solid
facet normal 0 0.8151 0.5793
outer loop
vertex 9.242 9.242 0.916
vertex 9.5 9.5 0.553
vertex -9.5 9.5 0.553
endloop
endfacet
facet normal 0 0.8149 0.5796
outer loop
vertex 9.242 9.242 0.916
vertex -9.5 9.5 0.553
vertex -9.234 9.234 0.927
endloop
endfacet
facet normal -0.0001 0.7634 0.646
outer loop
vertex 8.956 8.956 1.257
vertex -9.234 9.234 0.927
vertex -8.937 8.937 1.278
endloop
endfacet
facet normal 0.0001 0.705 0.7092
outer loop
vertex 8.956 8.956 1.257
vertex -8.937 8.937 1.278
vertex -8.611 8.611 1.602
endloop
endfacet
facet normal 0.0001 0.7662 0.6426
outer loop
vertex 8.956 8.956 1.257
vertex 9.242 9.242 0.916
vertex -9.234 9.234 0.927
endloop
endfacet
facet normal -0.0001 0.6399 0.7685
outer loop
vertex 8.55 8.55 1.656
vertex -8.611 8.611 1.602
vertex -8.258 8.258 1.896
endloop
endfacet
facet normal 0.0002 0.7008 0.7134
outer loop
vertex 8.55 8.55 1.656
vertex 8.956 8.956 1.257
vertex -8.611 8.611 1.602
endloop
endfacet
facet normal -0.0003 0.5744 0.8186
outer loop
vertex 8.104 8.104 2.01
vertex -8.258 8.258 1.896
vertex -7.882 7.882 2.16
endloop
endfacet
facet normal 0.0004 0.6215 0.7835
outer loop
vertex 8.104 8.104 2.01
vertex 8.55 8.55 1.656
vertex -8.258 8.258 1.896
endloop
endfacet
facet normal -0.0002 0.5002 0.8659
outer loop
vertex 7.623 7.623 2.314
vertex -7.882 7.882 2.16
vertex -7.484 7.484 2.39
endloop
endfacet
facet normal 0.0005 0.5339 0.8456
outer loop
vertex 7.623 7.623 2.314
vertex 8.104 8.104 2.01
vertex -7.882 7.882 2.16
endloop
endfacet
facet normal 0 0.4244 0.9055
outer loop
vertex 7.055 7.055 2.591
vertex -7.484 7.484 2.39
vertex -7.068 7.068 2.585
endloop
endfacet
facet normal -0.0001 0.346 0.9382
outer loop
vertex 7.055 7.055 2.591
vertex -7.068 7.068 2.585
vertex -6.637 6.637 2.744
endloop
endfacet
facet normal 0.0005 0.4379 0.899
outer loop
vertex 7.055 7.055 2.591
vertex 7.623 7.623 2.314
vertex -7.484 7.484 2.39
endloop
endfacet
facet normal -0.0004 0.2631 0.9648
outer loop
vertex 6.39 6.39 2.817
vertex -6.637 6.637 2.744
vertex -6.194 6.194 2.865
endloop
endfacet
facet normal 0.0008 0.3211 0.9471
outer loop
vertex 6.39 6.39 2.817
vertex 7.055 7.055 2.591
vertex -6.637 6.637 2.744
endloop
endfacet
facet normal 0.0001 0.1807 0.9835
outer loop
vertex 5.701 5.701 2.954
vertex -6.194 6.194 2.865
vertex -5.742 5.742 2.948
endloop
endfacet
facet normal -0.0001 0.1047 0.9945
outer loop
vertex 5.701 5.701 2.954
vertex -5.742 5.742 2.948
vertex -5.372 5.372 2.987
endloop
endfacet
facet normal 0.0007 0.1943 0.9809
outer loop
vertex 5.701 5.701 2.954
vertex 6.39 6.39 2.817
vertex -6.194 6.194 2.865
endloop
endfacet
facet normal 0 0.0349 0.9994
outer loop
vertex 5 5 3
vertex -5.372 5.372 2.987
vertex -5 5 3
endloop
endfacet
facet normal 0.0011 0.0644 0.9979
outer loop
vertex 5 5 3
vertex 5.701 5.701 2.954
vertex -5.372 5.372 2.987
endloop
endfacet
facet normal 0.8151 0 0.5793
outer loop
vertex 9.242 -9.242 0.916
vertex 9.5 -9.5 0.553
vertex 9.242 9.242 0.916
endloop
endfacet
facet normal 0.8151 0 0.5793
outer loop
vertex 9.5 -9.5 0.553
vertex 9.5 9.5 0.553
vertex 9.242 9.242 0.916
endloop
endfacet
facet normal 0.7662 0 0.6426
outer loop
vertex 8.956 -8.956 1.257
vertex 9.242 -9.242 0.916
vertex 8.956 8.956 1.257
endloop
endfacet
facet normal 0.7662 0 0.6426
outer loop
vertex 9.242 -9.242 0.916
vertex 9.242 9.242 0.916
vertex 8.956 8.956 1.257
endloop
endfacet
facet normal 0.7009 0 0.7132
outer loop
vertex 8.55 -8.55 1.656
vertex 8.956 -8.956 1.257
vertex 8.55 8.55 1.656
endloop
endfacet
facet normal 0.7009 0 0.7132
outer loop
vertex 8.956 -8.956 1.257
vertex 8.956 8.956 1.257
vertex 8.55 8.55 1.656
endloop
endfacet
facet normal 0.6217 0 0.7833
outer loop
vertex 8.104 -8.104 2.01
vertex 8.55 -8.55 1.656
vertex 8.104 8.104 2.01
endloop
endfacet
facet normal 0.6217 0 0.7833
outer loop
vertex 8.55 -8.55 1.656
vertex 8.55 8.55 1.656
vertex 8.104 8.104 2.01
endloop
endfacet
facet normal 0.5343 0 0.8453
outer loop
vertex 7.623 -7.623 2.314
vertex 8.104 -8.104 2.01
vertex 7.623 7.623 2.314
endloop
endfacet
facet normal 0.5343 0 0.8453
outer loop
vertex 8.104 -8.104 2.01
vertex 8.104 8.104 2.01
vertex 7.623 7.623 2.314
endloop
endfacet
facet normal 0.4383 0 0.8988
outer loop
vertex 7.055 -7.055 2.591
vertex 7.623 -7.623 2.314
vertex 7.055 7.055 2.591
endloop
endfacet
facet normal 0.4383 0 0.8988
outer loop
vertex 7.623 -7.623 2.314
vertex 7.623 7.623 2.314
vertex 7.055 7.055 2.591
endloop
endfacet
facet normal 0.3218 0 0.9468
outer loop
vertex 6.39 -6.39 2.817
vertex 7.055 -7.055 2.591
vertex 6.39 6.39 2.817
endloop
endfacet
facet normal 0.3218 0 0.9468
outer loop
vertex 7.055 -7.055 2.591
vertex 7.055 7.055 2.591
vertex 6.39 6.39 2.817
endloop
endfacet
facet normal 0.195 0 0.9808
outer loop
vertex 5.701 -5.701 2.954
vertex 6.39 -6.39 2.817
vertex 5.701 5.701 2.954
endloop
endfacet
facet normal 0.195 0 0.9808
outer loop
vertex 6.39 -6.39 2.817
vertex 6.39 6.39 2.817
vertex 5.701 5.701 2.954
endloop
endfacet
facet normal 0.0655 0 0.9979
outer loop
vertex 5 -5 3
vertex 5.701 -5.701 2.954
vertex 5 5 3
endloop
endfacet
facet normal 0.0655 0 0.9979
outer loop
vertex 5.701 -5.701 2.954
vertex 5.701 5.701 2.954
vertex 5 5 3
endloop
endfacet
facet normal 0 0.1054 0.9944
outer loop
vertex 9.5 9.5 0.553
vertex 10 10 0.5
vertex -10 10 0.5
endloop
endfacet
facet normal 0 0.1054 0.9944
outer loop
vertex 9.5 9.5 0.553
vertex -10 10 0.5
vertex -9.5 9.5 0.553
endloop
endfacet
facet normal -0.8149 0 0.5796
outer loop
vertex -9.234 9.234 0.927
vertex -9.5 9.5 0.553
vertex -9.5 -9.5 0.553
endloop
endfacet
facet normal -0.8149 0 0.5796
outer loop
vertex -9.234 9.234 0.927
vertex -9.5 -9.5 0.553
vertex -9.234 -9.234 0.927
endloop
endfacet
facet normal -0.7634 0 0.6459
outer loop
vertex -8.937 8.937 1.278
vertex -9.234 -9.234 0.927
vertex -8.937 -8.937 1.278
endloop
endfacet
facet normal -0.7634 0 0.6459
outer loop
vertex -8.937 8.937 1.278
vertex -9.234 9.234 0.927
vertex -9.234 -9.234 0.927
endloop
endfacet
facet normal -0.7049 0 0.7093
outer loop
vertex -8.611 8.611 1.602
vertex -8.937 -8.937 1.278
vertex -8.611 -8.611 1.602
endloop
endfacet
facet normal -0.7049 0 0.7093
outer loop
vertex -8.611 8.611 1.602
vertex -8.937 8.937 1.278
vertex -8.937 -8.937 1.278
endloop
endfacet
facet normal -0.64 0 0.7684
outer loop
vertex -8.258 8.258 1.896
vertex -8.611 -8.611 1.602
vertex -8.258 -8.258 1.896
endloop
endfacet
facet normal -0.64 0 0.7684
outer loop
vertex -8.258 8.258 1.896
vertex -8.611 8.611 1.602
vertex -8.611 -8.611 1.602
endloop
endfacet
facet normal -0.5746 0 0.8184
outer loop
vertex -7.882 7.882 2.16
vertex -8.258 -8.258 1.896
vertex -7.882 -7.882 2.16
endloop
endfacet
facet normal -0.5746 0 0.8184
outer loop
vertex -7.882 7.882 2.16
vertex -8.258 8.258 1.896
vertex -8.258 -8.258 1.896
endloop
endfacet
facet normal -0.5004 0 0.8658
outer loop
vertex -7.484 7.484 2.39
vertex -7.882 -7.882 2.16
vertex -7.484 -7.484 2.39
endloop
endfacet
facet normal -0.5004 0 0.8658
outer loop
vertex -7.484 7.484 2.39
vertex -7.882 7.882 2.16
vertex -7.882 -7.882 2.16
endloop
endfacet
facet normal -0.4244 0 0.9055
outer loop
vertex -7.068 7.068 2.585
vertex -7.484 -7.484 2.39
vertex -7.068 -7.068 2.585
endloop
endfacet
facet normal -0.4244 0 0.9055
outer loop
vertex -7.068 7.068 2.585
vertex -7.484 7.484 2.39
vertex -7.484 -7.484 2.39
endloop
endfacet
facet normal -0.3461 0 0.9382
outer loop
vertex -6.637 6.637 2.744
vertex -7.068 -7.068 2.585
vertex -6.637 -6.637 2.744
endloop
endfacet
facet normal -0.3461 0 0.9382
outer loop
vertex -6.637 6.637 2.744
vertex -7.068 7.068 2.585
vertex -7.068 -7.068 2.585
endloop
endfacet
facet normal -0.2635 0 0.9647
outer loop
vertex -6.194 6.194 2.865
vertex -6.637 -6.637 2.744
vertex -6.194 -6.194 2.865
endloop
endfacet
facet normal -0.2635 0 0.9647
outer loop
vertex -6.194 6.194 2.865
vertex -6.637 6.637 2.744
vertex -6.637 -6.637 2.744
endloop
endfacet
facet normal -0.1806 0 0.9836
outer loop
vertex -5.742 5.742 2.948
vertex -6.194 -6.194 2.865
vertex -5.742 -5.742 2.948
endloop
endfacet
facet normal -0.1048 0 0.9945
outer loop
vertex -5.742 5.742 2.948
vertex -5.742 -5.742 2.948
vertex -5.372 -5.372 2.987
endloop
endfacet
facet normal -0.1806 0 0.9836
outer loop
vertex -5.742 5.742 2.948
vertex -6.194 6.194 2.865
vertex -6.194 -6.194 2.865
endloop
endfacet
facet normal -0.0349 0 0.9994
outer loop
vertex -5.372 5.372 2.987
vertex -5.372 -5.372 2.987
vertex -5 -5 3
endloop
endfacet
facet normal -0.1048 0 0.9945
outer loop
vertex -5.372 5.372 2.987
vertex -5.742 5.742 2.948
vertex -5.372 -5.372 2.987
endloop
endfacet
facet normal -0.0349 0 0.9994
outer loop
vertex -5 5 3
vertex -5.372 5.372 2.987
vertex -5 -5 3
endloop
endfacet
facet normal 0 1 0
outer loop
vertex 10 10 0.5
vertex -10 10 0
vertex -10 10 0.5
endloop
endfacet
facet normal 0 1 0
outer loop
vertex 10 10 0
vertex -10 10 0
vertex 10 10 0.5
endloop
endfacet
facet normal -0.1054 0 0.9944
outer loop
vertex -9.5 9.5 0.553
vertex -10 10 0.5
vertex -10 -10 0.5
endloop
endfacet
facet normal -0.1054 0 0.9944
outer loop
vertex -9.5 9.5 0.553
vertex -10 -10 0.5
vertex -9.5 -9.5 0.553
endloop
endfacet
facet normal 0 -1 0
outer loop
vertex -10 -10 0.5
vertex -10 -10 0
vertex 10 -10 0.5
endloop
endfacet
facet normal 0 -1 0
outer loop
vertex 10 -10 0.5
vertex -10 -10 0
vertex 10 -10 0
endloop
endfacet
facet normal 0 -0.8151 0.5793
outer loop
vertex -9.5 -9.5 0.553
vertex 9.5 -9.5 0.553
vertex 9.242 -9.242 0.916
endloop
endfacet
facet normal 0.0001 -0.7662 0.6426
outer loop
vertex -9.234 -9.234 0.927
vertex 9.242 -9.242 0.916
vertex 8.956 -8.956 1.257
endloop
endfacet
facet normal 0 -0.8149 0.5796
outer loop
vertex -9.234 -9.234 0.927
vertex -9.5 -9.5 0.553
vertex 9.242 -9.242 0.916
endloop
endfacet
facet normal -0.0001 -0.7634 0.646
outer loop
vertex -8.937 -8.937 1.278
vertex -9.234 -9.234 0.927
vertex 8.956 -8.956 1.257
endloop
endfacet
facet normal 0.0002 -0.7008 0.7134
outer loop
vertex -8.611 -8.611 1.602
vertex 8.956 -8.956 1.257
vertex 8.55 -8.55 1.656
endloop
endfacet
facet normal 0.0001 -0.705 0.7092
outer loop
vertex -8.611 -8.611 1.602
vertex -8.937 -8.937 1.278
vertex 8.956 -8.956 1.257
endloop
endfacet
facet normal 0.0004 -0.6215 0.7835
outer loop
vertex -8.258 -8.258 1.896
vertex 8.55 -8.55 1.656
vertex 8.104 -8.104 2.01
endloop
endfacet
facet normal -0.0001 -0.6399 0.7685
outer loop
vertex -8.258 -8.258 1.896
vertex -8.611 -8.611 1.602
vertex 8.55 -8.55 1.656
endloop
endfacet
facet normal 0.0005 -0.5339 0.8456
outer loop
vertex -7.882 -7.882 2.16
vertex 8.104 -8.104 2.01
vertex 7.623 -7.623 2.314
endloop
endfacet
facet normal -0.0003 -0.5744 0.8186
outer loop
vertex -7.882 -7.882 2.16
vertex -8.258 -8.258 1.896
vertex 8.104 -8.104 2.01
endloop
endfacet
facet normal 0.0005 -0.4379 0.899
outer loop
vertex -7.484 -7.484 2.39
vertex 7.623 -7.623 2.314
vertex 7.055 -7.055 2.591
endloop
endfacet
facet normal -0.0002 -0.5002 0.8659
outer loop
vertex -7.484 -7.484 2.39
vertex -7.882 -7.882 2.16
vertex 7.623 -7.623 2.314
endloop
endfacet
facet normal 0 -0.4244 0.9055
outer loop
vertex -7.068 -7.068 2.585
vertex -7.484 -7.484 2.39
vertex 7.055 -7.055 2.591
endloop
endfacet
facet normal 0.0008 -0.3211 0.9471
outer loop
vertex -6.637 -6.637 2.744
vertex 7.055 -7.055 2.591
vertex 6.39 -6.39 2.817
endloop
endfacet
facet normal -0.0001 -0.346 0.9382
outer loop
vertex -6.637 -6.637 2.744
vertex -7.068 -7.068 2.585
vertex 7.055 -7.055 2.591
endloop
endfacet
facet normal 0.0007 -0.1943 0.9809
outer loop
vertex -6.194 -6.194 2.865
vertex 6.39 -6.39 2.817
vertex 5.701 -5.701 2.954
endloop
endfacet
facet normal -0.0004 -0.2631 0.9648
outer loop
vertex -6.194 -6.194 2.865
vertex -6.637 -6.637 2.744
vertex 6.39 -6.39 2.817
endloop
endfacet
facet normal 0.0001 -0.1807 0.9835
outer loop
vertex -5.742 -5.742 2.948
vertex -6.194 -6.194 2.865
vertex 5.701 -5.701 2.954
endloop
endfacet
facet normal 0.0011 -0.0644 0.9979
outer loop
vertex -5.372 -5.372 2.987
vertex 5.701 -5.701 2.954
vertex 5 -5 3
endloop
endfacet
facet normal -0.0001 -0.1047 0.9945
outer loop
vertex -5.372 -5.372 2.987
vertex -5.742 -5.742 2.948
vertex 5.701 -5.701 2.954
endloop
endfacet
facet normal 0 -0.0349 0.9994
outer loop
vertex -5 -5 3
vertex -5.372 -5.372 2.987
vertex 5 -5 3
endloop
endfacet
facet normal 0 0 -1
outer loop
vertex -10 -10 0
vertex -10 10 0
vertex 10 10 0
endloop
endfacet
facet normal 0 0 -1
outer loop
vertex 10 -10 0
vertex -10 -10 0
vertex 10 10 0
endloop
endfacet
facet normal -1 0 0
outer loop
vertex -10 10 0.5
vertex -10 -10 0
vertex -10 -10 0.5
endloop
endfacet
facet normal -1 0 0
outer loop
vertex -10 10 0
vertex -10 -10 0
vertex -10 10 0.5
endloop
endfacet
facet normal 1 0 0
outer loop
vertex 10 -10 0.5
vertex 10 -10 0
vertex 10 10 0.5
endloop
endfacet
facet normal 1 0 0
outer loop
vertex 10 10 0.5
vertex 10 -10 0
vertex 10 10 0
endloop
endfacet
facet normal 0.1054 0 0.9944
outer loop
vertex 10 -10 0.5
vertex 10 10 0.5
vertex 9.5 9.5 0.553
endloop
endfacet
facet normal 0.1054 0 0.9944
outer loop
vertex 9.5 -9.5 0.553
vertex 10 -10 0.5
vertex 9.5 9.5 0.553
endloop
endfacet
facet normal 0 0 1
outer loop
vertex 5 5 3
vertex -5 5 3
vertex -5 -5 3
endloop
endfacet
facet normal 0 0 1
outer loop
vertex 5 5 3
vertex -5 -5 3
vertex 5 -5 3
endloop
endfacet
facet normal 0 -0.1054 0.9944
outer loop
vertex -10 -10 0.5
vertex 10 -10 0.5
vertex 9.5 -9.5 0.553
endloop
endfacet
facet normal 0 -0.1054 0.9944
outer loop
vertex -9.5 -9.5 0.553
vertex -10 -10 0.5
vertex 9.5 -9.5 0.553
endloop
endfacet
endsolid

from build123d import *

# Parameters (mm, degrees)
SKETCH_W           = 20
SKETCH_H           = 20
PAD_DEPTH          = 3
POCKET_DEPTH       = 66.886851
POCKET_DEPTH_BACK  = 66.886851
POLARPATTERN_COUNT = 4


with BuildPart() as part:
    # Sketch → Pad (new body)
    with BuildSketch(Plane.XY):
        Rectangle(SKETCH_W, SKETCH_H)
    extrude(amount=PAD_DEPTH)

    # Sketch001 → Pocket (cut, two sides)
    with BuildSketch(Plane.XZ) as pocket_sk:
        with BuildLine():
            Line((10, 0.5), (9.5, 0.552552))
            ThreePointArc((9.5, 0.552552), (7.56125, 2.348555), (5, 3))
            Line((5, 3), (10, 3))
            Line((10, 3), (10, 0.5))
        make_face()
    pocket = extrude(amount=-POCKET_DEPTH, mode=Mode.SUBTRACT) + extrude(pocket_sk.sketch, amount=POCKET_DEPTH_BACK, mode=Mode.SUBTRACT)

    # PolarPattern: Pocket ×4 about axis
    polarpattern_axis = Axis((0, 0, 0), (0, 0, 1))
    for i in range(1, POLARPATTERN_COUNT):
        add(pocket.rotate(polarpattern_axis, i * 360 / POLARPATTERN_COUNT), mode=Mode.SUBTRACT)


solid = part.part
